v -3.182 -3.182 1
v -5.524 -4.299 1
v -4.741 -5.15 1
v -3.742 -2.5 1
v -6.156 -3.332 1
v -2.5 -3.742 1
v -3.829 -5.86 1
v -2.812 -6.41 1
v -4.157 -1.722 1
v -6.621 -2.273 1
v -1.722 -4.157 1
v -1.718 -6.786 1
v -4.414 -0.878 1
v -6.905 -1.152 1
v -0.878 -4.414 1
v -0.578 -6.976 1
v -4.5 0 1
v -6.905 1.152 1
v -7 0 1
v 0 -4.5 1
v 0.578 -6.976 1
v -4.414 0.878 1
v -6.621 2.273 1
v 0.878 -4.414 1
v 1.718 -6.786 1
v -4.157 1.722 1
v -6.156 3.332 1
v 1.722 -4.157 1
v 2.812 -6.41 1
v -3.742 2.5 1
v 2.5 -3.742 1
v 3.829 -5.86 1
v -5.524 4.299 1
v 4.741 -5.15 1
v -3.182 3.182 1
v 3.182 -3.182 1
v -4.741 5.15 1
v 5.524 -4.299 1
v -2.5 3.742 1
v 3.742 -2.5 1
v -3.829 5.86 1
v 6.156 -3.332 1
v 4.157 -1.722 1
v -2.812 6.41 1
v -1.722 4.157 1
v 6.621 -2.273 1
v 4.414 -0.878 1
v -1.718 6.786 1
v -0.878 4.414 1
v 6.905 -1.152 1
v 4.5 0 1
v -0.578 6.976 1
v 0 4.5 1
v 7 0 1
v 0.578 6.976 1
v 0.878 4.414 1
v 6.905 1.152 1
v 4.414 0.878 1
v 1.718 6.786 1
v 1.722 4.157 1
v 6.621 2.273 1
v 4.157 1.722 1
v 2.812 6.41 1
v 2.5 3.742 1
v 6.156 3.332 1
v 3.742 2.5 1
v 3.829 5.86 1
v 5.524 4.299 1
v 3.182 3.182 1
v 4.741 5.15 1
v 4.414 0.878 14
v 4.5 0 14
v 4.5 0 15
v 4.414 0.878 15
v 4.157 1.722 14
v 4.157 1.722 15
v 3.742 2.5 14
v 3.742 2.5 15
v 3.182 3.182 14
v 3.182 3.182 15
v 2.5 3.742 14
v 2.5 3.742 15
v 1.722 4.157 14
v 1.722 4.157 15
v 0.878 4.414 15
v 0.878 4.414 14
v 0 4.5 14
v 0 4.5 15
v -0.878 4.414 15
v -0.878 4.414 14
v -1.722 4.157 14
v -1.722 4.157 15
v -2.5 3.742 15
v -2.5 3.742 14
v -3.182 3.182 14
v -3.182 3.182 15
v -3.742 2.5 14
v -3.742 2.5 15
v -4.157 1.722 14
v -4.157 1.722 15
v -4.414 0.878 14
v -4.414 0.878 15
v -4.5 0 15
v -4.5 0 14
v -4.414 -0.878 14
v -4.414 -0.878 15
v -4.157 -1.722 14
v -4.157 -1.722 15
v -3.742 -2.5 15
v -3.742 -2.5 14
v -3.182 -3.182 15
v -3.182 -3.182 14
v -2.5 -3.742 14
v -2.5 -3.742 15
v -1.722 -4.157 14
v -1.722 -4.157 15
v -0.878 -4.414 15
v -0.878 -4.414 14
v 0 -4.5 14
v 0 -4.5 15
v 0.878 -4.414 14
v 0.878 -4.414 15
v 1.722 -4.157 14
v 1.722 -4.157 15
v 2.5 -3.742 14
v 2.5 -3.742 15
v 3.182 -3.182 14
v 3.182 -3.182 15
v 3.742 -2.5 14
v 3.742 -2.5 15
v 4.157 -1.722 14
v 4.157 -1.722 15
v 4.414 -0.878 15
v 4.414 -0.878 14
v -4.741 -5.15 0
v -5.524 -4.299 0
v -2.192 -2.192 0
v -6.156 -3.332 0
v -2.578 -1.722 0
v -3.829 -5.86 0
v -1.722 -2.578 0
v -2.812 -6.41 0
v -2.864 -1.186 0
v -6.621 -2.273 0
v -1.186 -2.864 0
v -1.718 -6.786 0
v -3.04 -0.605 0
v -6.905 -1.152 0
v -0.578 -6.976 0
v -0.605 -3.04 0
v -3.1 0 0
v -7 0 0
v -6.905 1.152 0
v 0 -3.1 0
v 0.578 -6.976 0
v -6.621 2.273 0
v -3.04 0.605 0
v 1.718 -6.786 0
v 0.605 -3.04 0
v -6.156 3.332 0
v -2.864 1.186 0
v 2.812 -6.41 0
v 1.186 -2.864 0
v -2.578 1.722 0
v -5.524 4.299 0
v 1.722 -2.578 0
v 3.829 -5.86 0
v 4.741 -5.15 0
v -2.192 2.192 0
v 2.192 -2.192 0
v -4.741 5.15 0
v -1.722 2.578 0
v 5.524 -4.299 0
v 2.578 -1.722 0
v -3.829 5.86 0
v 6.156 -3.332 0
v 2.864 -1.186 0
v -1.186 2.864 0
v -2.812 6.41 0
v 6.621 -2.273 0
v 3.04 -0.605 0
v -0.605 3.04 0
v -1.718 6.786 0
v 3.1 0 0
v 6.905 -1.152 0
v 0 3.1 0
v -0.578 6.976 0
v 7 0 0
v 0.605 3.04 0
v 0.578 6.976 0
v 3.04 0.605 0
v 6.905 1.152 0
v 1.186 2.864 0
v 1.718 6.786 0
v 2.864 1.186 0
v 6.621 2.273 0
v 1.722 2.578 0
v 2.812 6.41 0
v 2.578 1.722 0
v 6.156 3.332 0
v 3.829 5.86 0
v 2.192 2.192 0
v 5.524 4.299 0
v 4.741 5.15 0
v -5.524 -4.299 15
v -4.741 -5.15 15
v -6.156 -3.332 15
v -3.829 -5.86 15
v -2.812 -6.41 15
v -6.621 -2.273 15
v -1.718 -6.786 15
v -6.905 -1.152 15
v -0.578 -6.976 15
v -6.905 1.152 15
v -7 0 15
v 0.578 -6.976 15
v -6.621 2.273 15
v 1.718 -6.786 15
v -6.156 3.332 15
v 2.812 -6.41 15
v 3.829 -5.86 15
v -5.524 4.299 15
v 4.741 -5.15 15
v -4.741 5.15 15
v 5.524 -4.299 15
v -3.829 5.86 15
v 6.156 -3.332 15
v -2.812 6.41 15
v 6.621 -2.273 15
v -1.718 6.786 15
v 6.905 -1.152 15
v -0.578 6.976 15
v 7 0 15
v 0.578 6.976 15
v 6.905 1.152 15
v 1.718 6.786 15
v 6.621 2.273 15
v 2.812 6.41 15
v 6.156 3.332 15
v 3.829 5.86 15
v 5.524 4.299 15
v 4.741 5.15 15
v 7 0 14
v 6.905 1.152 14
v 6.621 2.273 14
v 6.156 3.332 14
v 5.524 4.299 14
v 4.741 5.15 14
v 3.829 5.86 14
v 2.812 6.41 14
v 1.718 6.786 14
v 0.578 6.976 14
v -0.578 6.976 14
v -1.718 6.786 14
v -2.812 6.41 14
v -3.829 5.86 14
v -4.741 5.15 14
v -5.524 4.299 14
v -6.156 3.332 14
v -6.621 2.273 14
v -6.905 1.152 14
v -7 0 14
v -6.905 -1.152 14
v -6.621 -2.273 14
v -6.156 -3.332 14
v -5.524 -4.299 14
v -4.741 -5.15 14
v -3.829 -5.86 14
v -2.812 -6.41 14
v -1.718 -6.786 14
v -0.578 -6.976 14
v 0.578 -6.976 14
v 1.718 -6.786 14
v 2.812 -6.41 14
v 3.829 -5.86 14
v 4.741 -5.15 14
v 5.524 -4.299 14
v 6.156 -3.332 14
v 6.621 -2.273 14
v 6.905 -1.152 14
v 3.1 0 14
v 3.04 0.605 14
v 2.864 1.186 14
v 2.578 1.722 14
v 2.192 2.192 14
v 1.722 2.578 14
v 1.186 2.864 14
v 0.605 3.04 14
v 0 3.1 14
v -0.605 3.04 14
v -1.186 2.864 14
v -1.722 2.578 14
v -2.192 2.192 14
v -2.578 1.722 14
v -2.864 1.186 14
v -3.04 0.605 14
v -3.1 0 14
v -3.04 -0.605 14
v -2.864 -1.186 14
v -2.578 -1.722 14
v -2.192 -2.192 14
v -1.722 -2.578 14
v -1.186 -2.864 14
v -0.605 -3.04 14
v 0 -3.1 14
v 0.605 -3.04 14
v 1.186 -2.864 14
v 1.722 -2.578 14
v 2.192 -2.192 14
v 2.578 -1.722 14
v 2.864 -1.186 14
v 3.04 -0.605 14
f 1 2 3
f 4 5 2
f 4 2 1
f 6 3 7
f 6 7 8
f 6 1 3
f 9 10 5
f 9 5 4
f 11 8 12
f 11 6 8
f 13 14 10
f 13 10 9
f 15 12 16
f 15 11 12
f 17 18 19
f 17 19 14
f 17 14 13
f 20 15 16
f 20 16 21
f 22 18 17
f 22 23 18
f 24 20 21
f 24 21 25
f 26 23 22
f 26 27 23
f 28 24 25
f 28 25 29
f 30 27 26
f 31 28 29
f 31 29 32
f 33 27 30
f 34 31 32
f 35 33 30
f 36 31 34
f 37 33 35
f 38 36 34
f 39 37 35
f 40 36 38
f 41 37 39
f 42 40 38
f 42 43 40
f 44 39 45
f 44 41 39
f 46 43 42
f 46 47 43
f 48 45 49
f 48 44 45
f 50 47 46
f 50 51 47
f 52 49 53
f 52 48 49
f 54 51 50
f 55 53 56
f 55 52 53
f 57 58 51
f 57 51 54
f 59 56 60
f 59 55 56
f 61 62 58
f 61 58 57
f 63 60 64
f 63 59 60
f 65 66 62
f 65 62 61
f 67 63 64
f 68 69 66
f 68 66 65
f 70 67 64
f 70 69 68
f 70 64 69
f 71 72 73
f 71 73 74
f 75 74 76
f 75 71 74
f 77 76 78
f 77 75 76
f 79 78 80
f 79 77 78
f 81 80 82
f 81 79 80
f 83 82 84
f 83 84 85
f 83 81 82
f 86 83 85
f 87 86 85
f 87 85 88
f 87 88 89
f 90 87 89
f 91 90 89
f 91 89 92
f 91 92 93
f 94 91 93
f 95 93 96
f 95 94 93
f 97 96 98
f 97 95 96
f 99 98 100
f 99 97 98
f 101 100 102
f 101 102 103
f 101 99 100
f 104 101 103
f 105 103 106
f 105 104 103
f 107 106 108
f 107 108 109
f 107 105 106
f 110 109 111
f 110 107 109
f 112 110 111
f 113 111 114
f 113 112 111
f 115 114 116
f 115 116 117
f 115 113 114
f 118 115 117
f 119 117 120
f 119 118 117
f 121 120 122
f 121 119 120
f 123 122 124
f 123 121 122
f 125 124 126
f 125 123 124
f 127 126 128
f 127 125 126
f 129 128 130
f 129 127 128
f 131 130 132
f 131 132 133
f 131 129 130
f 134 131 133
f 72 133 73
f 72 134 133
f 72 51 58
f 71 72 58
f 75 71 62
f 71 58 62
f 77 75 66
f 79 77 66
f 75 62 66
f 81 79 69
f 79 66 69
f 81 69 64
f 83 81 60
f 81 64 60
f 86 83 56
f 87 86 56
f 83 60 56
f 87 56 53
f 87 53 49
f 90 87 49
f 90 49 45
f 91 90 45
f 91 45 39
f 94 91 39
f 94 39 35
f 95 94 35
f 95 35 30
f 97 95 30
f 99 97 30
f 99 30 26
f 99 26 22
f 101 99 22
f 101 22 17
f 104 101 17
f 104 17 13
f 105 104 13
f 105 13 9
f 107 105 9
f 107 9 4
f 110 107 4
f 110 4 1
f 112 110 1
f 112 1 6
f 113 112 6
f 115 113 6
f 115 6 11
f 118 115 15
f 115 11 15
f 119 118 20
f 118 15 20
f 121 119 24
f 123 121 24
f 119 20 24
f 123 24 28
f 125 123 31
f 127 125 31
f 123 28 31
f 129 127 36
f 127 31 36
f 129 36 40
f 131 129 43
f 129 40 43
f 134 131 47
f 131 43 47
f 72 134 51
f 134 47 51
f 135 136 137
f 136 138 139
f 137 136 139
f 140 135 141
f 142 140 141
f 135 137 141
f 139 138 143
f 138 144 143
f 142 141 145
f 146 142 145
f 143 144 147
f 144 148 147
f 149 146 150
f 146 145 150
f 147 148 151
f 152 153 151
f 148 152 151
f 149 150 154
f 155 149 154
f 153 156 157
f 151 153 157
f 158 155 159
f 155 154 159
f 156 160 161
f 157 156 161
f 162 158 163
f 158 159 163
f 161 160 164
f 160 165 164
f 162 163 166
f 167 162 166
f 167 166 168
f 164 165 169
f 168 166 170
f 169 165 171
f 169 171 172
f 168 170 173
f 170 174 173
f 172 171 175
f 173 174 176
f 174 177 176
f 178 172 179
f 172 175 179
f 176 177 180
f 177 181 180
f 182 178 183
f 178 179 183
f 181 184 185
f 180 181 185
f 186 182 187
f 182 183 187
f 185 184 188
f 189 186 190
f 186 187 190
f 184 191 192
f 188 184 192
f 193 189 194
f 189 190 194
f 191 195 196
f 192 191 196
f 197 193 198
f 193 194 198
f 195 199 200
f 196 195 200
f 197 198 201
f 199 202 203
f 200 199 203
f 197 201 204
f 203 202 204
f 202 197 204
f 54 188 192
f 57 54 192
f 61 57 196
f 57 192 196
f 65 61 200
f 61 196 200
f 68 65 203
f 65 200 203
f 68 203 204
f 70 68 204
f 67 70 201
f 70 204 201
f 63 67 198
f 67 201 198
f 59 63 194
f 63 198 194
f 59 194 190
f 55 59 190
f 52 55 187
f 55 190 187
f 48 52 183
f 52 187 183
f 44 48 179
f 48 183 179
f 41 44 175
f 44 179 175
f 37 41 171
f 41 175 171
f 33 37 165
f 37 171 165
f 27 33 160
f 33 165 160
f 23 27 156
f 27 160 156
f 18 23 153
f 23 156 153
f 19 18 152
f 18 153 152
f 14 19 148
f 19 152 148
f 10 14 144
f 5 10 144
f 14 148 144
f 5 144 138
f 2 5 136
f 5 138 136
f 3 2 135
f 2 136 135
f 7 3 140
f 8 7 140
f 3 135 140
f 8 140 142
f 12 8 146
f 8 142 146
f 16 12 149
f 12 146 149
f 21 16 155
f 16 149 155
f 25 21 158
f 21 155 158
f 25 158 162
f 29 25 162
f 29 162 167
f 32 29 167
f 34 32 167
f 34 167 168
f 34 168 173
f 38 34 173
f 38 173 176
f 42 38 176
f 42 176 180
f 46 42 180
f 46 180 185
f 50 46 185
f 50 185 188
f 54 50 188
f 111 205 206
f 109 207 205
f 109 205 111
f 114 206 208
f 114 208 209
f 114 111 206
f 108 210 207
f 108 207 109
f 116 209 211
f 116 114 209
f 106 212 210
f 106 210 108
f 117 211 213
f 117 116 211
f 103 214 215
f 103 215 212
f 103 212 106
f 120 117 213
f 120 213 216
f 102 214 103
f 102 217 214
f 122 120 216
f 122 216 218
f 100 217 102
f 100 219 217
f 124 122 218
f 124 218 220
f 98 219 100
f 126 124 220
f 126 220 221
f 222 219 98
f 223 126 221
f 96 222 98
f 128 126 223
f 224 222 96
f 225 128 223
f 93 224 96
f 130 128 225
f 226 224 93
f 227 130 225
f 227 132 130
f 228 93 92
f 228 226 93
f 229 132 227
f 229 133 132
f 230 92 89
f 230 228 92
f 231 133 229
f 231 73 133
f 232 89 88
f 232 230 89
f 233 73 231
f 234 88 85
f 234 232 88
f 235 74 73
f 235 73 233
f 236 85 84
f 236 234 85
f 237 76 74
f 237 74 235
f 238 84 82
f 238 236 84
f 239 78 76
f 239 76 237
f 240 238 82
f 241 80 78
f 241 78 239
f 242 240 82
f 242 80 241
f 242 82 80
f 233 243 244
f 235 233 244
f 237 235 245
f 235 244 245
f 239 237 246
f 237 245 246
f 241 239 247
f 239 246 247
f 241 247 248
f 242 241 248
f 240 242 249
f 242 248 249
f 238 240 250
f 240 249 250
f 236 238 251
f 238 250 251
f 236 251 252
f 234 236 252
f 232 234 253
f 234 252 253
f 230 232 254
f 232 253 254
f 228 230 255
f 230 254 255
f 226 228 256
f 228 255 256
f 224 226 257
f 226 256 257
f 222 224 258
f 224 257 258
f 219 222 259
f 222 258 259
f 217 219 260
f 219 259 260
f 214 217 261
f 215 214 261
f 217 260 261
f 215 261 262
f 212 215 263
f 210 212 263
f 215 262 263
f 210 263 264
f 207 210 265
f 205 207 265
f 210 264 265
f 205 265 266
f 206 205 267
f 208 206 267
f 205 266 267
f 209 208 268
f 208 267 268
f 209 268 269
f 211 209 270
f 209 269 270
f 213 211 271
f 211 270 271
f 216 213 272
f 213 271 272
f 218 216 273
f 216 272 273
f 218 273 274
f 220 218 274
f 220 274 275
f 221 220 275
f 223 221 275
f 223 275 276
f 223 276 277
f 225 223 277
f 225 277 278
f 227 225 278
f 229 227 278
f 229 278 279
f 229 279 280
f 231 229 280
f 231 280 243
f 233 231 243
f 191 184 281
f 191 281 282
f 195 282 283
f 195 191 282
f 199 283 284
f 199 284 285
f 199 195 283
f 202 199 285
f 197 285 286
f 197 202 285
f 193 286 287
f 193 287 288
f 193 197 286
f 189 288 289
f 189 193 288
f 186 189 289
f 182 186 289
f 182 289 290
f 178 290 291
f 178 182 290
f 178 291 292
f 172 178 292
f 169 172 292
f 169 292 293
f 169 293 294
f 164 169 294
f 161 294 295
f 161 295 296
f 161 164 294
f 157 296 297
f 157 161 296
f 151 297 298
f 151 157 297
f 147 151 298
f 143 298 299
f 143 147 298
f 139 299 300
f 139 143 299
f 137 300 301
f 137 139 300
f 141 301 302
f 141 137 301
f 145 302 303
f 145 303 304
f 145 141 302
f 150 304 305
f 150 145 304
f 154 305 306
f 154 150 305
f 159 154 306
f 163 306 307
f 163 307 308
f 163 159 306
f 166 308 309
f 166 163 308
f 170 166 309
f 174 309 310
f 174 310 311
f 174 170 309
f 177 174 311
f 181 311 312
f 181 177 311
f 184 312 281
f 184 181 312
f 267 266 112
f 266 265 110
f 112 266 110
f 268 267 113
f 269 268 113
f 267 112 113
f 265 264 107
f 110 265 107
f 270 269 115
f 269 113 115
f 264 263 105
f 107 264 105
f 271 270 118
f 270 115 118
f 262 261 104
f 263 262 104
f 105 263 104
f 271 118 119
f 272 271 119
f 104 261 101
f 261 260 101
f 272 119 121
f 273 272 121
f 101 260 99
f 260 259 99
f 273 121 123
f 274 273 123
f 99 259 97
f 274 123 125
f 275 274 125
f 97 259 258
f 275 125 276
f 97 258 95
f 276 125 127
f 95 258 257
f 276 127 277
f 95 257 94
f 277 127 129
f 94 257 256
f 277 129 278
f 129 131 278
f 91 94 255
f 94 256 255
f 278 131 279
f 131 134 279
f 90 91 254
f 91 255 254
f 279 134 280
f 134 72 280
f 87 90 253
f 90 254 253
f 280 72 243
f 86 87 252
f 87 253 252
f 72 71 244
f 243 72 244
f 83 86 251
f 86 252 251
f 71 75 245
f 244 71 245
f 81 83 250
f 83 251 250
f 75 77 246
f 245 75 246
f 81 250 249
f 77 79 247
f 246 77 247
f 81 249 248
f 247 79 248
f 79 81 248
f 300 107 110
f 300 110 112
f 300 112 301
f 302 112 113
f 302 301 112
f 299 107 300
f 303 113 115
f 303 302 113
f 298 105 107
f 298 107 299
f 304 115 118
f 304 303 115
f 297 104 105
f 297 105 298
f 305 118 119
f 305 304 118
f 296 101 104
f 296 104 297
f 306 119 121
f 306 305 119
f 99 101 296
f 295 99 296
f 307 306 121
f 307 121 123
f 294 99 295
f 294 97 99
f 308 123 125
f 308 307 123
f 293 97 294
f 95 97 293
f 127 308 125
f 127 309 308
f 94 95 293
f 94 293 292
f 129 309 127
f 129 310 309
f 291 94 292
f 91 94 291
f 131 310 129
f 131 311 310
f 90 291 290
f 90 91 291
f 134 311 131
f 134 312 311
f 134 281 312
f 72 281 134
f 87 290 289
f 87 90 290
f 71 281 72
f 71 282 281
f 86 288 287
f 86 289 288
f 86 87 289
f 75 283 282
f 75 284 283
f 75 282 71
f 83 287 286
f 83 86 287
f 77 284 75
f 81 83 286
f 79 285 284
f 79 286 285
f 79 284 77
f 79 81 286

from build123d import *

# Parameters (mm, degrees)
SKETCH_1_R      = 4.5
SKETCH_1_R_2    = 3.1
EXTRUDE_2_DEPTH = 14
SKETCH_1_4_R    = 7
SKETCH_1_4_R_2  = 4.5
EXTRUDE_3_DEPTH = 1
SKETCH_2_R      = 7
SKETCH_2_R_2    = 4.5
EXTRUDE_4_DEPTH = 1


with BuildPart() as part:
    # Эскиз1 → Бобышка-Вытянуть2 (new body)
    with BuildSketch(Plane.XY):
        Circle(SKETCH_1_R)
        Circle(SKETCH_1_R_2, mode=Mode.SUBTRACT)
    extrude(amount=EXTRUDE_2_DEPTH)

    # Эскиз1<4> → Бобышка-Вытянуть3 (add)
    with BuildSketch(Plane.XY):
        Circle(SKETCH_1_4_R)
        Circle(SKETCH_1_4_R_2, mode=Mode.SUBTRACT)
    extrude(amount=EXTRUDE_3_DEPTH)


with BuildPart() as body_2:
    # Эскиз2 → Бобышка-Вытянуть4 (new body)
    with BuildSketch(Plane.XY.offset(14)):
        Circle(SKETCH_2_R)
        Circle(SKETCH_2_R_2, mode=Mode.SUBTRACT)
    extrude(amount=EXTRUDE_4_DEPTH)


solid = Compound([part.part, body_2.part])
